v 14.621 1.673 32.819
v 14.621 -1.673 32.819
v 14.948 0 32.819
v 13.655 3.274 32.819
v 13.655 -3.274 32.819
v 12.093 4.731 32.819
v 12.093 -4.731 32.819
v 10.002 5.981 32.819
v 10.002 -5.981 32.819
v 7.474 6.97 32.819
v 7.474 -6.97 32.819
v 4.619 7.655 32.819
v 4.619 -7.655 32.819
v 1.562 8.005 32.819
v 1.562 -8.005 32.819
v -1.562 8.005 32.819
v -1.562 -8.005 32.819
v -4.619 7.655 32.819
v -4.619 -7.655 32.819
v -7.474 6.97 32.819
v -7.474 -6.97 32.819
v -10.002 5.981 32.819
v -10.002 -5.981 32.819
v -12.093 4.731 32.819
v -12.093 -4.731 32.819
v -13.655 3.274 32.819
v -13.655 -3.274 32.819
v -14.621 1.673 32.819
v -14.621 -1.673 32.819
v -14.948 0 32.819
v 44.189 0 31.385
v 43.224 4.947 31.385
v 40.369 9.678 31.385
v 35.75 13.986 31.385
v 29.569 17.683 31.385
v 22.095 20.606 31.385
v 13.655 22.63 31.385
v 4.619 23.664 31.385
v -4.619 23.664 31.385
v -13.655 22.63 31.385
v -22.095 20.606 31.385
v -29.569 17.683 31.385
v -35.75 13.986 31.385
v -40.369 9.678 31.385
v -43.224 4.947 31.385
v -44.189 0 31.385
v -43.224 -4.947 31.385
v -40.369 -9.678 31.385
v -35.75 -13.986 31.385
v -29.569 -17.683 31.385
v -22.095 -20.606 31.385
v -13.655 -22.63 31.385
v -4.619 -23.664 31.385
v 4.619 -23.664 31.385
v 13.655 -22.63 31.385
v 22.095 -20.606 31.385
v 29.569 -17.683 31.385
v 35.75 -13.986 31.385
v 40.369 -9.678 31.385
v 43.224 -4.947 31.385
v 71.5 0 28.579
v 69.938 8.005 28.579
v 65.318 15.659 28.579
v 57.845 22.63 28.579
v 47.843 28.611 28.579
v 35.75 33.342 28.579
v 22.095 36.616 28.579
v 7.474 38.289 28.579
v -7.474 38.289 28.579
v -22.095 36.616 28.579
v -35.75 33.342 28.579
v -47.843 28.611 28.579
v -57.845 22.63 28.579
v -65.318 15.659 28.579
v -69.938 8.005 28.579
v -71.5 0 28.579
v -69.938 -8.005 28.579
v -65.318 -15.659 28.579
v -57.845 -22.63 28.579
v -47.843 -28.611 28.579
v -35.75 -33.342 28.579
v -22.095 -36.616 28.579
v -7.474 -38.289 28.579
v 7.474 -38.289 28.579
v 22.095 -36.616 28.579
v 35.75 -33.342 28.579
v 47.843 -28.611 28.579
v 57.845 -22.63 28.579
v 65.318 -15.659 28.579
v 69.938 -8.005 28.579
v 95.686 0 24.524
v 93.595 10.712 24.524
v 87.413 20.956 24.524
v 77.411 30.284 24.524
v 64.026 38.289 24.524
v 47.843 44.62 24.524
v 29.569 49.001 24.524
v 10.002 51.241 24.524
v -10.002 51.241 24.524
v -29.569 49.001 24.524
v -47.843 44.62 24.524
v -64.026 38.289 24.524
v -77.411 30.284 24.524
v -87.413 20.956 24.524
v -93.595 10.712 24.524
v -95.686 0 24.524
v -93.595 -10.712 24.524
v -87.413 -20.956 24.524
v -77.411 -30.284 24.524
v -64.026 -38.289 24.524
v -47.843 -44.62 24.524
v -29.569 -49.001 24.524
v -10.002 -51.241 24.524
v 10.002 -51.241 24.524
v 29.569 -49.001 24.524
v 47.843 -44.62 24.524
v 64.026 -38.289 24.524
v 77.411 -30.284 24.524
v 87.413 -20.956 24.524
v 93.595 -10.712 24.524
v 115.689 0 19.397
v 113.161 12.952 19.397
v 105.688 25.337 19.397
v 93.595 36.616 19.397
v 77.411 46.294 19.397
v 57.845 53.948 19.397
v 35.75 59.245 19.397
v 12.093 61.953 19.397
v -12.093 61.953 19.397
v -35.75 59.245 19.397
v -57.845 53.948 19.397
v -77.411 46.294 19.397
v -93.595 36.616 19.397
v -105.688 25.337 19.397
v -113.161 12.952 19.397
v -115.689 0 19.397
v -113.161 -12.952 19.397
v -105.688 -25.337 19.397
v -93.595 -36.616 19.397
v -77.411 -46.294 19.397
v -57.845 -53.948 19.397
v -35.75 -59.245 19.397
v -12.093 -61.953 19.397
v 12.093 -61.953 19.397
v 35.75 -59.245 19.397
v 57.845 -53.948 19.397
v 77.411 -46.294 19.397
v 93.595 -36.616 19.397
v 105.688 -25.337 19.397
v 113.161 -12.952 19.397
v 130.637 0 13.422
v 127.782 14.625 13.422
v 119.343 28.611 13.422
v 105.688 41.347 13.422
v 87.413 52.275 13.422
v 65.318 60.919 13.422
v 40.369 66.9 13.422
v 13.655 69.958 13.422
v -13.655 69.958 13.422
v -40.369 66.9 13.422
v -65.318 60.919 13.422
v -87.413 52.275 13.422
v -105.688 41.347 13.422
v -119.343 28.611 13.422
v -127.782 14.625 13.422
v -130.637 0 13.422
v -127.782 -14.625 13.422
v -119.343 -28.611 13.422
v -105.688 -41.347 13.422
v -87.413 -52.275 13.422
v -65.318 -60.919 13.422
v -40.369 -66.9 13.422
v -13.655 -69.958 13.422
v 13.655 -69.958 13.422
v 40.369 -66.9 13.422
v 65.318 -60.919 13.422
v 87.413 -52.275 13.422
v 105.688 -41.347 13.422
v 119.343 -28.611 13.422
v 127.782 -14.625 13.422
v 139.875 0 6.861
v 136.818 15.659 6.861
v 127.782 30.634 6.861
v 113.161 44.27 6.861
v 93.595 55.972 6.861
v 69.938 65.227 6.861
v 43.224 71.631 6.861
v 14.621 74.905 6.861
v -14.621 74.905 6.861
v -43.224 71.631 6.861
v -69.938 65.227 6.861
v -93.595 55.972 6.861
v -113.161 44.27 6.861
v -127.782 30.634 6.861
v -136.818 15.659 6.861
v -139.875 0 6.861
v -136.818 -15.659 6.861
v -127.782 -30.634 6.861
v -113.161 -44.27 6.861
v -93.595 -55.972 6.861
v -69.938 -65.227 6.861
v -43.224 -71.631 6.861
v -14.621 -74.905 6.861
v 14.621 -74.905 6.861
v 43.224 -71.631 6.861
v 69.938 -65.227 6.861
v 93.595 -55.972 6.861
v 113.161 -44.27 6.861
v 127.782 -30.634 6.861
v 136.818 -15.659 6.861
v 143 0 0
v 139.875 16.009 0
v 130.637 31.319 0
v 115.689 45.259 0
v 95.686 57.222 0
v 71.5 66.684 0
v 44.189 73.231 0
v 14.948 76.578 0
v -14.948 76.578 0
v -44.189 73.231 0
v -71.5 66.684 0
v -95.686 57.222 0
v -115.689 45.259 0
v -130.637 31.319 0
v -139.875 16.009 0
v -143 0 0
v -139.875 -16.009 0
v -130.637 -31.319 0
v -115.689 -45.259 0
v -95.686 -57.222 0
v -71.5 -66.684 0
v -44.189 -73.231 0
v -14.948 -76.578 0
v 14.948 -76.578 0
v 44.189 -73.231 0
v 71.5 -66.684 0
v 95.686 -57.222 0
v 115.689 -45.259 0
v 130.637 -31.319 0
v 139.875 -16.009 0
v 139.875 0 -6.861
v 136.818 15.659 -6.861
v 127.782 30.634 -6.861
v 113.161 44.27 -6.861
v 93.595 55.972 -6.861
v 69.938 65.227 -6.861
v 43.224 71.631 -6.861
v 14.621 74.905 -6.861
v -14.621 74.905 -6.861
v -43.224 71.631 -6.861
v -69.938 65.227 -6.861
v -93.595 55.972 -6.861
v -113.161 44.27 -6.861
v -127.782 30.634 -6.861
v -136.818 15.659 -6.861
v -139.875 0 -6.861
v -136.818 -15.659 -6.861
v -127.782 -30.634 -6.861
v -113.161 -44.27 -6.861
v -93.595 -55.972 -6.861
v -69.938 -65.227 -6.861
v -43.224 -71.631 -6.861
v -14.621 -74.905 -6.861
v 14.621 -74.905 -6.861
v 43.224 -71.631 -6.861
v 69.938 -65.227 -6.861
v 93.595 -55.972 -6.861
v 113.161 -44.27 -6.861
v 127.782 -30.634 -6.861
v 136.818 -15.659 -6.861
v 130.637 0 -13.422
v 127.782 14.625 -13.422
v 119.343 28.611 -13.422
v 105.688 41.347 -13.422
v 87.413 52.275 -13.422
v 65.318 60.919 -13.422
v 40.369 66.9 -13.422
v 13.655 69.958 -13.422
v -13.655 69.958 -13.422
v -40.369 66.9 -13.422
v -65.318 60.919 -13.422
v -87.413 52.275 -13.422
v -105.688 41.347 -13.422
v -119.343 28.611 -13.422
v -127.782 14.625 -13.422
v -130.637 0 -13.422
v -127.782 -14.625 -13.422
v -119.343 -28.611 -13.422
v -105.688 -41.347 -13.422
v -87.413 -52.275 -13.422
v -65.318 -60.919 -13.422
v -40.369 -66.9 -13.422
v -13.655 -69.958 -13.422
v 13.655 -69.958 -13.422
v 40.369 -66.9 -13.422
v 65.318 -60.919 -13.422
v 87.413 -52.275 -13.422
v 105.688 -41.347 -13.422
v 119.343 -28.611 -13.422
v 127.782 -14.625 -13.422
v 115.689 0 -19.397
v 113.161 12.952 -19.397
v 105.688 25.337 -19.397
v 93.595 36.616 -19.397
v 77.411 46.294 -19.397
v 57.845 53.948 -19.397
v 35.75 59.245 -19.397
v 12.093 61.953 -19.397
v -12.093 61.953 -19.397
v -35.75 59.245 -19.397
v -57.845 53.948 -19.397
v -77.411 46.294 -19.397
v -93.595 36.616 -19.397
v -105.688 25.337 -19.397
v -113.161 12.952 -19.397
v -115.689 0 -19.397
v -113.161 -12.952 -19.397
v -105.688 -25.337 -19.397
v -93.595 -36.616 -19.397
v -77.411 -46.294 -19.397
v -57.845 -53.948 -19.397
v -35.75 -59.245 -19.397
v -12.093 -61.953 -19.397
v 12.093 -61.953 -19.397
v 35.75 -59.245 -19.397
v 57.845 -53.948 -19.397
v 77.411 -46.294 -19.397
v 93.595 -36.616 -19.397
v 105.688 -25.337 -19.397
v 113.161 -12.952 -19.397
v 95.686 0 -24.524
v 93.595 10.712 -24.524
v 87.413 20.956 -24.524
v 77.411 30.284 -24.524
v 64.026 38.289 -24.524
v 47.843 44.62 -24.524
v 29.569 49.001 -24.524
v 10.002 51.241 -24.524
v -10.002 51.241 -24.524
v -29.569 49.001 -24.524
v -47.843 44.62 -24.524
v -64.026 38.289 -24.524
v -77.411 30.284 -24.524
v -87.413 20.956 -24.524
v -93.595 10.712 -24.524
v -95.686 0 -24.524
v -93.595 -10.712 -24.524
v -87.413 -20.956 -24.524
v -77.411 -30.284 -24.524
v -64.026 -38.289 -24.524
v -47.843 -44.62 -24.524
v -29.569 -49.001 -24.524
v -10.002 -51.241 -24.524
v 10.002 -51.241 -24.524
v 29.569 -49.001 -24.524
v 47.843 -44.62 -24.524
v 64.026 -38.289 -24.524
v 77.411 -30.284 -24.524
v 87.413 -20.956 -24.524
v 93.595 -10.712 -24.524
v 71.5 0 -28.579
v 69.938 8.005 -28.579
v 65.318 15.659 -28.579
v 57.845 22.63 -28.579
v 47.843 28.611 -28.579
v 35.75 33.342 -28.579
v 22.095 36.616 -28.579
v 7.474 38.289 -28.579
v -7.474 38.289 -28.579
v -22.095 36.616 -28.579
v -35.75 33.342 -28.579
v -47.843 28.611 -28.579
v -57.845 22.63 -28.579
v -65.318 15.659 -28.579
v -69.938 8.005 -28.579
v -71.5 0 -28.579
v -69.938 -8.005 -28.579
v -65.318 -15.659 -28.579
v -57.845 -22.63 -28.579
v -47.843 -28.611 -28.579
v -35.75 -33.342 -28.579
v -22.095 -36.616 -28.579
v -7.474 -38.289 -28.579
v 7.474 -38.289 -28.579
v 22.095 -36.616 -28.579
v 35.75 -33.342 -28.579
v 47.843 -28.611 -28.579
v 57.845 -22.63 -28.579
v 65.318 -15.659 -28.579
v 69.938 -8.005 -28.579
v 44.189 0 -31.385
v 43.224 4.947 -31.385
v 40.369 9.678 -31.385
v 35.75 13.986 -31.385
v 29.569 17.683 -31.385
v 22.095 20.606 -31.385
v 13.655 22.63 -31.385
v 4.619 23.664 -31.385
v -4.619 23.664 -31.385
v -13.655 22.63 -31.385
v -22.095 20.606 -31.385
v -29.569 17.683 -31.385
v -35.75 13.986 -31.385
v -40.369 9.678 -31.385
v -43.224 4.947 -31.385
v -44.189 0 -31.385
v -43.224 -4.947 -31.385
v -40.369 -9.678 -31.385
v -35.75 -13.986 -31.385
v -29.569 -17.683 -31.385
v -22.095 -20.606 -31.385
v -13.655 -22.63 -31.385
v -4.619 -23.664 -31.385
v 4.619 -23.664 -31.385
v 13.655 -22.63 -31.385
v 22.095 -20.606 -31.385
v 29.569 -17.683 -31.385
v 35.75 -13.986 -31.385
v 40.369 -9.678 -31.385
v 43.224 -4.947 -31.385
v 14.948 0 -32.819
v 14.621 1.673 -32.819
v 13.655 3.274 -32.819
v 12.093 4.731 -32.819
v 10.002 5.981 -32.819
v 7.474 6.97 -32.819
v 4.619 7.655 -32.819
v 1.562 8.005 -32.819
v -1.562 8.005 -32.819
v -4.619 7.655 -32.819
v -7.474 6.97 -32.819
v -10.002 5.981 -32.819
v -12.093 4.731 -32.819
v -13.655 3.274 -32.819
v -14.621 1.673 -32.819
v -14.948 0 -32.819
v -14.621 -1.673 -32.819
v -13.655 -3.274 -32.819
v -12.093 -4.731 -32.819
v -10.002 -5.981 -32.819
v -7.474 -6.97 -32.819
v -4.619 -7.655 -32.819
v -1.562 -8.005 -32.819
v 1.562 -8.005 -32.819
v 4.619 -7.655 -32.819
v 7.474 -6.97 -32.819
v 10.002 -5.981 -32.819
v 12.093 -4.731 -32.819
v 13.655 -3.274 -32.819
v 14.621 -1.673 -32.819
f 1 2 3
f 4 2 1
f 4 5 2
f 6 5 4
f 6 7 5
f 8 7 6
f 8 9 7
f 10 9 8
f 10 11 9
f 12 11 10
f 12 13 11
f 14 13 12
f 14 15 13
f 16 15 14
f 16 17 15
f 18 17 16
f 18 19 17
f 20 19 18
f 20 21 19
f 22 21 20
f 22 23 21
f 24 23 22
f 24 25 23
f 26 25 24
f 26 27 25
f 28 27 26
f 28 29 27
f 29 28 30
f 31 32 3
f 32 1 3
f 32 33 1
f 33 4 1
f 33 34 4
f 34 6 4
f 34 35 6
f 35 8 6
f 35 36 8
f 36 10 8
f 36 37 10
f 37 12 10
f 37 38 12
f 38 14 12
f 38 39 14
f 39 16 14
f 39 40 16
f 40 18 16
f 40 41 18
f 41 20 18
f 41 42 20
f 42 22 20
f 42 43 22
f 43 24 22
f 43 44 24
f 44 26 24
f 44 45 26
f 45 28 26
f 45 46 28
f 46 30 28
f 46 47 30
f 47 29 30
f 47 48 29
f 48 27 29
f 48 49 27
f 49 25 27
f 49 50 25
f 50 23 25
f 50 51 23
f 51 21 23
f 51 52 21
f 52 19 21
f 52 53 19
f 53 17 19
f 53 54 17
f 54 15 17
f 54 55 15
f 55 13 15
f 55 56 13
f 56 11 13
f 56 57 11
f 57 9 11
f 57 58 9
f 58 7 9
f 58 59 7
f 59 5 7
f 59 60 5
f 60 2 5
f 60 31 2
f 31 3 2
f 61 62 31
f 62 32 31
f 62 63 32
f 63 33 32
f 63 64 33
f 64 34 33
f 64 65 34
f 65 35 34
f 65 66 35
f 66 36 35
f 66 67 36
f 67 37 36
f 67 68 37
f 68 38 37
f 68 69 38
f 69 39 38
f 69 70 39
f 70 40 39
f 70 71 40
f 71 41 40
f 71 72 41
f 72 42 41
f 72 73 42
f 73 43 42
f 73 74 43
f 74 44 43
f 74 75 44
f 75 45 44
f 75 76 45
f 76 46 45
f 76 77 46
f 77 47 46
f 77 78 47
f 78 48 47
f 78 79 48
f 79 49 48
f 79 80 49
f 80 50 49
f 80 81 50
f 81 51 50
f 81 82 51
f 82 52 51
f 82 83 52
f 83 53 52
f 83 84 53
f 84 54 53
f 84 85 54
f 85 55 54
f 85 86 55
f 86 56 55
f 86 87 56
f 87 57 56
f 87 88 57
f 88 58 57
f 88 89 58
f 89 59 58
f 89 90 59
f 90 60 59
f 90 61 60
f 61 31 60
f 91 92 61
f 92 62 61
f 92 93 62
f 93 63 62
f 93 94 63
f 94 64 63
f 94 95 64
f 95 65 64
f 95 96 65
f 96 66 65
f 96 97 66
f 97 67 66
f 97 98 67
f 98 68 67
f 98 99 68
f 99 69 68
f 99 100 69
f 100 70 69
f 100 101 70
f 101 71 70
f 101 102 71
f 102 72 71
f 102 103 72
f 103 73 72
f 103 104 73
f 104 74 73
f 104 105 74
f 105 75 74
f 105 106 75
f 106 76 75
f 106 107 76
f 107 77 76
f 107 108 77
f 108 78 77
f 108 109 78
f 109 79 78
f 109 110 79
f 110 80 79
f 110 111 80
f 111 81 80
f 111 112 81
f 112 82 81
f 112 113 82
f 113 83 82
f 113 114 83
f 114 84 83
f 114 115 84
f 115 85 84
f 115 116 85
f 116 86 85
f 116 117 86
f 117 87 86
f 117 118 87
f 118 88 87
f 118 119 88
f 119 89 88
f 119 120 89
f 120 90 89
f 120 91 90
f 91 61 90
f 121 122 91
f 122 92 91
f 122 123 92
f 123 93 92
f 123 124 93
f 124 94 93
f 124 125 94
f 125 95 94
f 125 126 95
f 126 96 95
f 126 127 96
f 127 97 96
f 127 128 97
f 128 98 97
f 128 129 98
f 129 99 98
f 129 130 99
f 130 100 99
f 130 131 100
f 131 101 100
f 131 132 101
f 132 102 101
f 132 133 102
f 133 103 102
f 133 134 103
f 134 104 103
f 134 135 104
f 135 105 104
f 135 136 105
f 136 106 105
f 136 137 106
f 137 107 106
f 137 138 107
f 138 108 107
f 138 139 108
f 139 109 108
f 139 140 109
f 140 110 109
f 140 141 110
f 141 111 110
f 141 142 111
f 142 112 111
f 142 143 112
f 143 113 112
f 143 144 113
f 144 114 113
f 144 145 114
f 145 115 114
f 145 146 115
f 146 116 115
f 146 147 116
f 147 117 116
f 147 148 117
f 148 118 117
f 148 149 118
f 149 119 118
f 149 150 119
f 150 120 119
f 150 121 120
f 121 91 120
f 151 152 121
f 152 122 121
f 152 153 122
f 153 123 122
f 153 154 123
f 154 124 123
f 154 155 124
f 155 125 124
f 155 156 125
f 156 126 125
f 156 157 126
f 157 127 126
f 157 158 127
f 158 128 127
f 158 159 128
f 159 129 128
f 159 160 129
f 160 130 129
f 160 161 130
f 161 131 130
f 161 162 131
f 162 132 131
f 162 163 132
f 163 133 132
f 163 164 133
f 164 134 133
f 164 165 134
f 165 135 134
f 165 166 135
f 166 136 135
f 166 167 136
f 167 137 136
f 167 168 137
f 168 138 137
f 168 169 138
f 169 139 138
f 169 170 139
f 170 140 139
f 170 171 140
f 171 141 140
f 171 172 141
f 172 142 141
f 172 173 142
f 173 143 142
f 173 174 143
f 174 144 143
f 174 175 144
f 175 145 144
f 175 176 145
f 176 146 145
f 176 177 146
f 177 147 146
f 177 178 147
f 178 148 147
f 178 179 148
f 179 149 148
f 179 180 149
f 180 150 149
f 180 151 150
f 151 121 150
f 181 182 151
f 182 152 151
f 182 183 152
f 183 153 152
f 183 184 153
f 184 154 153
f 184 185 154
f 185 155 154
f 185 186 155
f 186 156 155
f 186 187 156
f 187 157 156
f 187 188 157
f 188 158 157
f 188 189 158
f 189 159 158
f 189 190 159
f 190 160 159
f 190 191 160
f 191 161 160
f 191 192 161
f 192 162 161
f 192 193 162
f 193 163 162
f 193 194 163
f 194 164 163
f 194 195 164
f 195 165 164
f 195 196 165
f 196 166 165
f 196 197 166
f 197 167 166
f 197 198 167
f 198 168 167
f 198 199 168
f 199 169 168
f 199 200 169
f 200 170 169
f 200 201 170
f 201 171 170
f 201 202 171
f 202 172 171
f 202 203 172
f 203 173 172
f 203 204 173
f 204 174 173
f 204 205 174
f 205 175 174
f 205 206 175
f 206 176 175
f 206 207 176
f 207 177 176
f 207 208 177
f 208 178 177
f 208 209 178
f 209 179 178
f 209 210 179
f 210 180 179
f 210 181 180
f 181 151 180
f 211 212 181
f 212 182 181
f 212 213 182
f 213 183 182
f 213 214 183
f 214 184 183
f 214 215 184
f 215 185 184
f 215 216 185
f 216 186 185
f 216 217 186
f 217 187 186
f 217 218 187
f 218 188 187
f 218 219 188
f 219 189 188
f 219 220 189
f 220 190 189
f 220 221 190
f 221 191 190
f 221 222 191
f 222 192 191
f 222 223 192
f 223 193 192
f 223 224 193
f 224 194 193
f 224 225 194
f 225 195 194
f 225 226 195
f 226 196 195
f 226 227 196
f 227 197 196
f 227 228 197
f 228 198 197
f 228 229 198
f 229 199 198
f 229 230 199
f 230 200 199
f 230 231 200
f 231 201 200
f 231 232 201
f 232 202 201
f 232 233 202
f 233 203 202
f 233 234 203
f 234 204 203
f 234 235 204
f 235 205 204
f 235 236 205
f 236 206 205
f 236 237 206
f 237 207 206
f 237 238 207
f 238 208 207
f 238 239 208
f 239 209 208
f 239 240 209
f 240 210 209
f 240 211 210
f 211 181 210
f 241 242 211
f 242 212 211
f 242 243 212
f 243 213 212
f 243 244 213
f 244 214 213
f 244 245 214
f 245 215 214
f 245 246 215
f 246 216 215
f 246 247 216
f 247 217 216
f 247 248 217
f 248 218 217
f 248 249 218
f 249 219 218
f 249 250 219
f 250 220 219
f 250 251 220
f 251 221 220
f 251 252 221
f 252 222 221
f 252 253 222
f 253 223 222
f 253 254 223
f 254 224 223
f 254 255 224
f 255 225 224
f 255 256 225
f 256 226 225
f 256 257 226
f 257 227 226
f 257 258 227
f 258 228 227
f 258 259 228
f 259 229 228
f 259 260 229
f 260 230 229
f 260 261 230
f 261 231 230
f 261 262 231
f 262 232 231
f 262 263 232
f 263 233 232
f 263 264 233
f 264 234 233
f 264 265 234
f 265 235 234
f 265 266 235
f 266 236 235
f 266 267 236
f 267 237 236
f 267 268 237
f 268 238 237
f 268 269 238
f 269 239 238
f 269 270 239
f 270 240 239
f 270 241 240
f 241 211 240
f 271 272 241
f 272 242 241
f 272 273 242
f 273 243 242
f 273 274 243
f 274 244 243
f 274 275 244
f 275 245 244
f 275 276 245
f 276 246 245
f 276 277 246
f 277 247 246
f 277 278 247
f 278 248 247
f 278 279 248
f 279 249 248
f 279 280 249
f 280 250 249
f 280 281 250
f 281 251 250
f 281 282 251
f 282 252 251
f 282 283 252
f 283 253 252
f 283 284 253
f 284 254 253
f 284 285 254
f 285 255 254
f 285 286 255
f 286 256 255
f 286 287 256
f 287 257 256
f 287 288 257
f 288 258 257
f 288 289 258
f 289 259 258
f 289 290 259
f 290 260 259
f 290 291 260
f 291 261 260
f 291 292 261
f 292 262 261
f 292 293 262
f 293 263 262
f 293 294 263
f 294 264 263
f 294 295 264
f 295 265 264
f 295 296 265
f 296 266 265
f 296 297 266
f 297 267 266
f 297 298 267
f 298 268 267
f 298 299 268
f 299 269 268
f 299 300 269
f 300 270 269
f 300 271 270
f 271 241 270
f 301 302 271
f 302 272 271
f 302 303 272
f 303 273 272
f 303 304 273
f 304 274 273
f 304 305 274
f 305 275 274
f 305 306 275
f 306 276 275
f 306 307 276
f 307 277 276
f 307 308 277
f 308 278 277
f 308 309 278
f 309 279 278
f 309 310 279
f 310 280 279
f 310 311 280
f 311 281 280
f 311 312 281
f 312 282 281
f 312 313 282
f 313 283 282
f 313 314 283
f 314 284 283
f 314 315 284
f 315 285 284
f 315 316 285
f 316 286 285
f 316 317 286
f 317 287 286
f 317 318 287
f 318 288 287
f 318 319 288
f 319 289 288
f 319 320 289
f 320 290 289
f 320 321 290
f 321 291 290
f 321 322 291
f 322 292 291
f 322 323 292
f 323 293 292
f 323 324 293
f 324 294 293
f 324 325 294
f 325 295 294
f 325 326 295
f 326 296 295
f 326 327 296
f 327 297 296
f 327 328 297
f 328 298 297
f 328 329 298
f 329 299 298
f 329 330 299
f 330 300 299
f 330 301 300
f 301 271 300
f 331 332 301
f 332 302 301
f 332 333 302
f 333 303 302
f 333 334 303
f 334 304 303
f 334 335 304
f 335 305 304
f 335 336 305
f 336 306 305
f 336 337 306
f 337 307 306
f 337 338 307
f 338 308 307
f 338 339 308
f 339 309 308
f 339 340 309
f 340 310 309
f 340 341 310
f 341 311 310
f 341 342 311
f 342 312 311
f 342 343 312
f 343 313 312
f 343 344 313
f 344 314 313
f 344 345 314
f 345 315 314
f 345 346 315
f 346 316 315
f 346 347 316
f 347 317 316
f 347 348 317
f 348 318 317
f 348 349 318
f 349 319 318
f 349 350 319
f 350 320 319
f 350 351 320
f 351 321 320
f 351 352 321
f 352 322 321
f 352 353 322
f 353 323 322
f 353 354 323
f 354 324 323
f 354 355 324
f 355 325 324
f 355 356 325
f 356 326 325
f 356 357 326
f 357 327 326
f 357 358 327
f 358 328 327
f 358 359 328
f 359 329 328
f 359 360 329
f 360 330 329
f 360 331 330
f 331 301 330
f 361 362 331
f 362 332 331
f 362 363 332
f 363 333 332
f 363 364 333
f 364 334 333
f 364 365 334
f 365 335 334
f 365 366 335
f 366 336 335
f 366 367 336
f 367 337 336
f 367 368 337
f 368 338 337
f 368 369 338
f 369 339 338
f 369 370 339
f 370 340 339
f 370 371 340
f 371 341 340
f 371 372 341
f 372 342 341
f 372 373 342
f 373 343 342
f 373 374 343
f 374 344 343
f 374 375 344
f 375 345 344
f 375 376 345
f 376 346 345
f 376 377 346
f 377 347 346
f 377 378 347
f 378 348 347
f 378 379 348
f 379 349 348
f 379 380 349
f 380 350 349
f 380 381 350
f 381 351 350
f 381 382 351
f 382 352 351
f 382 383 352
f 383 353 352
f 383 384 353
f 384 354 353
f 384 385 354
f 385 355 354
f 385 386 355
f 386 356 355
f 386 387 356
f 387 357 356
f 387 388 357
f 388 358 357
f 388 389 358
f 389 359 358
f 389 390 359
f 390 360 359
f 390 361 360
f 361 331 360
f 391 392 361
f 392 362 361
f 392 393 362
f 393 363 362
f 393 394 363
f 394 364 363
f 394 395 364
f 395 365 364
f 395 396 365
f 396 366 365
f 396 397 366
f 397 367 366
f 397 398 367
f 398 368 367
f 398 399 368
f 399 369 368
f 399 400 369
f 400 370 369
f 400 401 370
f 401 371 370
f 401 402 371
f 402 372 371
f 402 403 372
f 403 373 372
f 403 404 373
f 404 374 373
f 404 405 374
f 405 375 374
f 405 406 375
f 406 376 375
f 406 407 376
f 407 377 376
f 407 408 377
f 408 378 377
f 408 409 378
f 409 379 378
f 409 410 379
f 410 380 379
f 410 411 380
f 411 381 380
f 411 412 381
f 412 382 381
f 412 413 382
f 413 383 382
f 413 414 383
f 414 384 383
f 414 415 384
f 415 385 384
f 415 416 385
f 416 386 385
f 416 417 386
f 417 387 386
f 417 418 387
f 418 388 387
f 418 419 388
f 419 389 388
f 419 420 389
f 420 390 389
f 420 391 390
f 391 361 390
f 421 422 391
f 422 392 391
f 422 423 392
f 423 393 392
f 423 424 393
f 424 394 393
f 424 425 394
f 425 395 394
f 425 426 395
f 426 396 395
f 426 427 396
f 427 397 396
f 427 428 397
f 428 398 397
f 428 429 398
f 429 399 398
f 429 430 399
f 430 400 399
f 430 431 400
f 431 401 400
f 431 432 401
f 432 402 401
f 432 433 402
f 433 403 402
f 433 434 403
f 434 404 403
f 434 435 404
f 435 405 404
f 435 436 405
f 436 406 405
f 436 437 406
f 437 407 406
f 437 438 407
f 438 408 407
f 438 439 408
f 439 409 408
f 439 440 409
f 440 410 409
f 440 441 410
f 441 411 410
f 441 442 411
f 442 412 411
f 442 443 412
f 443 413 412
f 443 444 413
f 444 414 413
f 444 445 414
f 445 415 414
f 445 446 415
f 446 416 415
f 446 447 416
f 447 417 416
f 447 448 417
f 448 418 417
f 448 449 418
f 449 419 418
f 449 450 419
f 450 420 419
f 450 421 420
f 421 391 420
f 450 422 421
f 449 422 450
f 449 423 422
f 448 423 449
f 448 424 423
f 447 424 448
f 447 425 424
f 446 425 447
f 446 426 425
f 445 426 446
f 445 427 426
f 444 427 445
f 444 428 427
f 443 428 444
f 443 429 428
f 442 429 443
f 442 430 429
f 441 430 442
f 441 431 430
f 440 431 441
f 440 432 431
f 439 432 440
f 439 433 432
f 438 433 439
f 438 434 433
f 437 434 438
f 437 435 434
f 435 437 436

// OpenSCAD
// Generated by SolidPython 1.0.1 on 2020-07-29 00:46:50


scale(v = [13, 7, 3]) {
	sphere(r = 11);
}
/***********************************************
*********      SolidPython code:      **********
************************************************
 
# import packages: SolidPython
from solid import *
from solid.utils import *
from itertools import chain, combinations, permutations


class Resize:

    def __init__(self, scad_file):
        self.scad_file = scad_file
        #self.scad_file = import_scad(scad_file)
        # cone/cylinder param:
        self.r1 = 0
        self.r2 = 0
        self.h = 0
        # rectangular prism param:
        self.w = 0
        self.l = 0
        # ellipse param:
        self.r = 0

    # import OpenScad code (file name corresponds to shape)


    # classify shape + parameters
    def assign(self, param1, param2, param3):
        if self.scad_file == 'cone.scad':
            self.r1 = param1
            self.r2 = param2
            self.h = param3
        elif self.scad_file == 'cylinder.scad':
            self.r1 = param1
            self.r2 = param2
            self.h = param3
        elif self.scad_file == 'rectangularPrism.scad':
            self.h = param1
            self.l = param2
            self.w = param3
        else:
            self.r = param1
            self.h = param2

    # resize parameters
    def iterate(self):
        x = range(3, 20, 2)
        i = 1
        if self.scad_file == 'cone.scad':
            tempList = list(permutations(x, 2))
            for temp in tempList:
                param1 = temp[0]
                param2 = temp[1]
                filepath = 'produced_scad_files/' + 'cone' + str(param1) + '_' + str(param2) + '_' + '.scad'
                scad_render_to_file(cylinder(h=param1, r1=param2, r2=0), filepath)

        elif self.scad_file == 'cylinder.scad':
            tempList = list(permutations(x, 3))
            for temp in tempList:
                param1 = temp[0]
                param2 = temp[1]
                filepath = 'produced_scad_files/' + 'cylinder' + str(param1) + '_' + str(param2) + '_' + '.scad'
                scad_render_to_file(cylinder(h=param1, r1=param2, r2=param2), filepath)

        elif self.scad_file == 'rectangularPrism.scad':
            tempList = list(permutations(x, 3))
            for temp in tempList:
                param1 = temp[0]
                param2 = temp[1]
                param3 = temp[2]
                filepath = 'produced_scad_files/' + 'rectangularPrism' + str(param1) + '_' + str(param2) + '_' + str(
                    param3) + '.scad'
                scad_render_to_file(cube(size=(param1, param2, param3)), filepath)

        elif self.scad_file == 'ellipse.scad':
            tempList = list(permutations(x, 4))
            for temp in tempList:
                param1 = temp[0]
                param2 = temp[1]
                param3 = temp[2]
                param4 = temp[3]
                filepath = 'produced_scad_files/' + 'ellipse' + str(param1) + '_' + str(param2) + '_' + str(param3) + '_' + str(param4) + '.scad'
                scad_render_to_file(scale([param1, param2, param3])(sphere(r=param4)), filepath)

    def render_to_scadfile(self):
        scad_render_to_file(scad, 'example.scad') 
 
************************************************/
